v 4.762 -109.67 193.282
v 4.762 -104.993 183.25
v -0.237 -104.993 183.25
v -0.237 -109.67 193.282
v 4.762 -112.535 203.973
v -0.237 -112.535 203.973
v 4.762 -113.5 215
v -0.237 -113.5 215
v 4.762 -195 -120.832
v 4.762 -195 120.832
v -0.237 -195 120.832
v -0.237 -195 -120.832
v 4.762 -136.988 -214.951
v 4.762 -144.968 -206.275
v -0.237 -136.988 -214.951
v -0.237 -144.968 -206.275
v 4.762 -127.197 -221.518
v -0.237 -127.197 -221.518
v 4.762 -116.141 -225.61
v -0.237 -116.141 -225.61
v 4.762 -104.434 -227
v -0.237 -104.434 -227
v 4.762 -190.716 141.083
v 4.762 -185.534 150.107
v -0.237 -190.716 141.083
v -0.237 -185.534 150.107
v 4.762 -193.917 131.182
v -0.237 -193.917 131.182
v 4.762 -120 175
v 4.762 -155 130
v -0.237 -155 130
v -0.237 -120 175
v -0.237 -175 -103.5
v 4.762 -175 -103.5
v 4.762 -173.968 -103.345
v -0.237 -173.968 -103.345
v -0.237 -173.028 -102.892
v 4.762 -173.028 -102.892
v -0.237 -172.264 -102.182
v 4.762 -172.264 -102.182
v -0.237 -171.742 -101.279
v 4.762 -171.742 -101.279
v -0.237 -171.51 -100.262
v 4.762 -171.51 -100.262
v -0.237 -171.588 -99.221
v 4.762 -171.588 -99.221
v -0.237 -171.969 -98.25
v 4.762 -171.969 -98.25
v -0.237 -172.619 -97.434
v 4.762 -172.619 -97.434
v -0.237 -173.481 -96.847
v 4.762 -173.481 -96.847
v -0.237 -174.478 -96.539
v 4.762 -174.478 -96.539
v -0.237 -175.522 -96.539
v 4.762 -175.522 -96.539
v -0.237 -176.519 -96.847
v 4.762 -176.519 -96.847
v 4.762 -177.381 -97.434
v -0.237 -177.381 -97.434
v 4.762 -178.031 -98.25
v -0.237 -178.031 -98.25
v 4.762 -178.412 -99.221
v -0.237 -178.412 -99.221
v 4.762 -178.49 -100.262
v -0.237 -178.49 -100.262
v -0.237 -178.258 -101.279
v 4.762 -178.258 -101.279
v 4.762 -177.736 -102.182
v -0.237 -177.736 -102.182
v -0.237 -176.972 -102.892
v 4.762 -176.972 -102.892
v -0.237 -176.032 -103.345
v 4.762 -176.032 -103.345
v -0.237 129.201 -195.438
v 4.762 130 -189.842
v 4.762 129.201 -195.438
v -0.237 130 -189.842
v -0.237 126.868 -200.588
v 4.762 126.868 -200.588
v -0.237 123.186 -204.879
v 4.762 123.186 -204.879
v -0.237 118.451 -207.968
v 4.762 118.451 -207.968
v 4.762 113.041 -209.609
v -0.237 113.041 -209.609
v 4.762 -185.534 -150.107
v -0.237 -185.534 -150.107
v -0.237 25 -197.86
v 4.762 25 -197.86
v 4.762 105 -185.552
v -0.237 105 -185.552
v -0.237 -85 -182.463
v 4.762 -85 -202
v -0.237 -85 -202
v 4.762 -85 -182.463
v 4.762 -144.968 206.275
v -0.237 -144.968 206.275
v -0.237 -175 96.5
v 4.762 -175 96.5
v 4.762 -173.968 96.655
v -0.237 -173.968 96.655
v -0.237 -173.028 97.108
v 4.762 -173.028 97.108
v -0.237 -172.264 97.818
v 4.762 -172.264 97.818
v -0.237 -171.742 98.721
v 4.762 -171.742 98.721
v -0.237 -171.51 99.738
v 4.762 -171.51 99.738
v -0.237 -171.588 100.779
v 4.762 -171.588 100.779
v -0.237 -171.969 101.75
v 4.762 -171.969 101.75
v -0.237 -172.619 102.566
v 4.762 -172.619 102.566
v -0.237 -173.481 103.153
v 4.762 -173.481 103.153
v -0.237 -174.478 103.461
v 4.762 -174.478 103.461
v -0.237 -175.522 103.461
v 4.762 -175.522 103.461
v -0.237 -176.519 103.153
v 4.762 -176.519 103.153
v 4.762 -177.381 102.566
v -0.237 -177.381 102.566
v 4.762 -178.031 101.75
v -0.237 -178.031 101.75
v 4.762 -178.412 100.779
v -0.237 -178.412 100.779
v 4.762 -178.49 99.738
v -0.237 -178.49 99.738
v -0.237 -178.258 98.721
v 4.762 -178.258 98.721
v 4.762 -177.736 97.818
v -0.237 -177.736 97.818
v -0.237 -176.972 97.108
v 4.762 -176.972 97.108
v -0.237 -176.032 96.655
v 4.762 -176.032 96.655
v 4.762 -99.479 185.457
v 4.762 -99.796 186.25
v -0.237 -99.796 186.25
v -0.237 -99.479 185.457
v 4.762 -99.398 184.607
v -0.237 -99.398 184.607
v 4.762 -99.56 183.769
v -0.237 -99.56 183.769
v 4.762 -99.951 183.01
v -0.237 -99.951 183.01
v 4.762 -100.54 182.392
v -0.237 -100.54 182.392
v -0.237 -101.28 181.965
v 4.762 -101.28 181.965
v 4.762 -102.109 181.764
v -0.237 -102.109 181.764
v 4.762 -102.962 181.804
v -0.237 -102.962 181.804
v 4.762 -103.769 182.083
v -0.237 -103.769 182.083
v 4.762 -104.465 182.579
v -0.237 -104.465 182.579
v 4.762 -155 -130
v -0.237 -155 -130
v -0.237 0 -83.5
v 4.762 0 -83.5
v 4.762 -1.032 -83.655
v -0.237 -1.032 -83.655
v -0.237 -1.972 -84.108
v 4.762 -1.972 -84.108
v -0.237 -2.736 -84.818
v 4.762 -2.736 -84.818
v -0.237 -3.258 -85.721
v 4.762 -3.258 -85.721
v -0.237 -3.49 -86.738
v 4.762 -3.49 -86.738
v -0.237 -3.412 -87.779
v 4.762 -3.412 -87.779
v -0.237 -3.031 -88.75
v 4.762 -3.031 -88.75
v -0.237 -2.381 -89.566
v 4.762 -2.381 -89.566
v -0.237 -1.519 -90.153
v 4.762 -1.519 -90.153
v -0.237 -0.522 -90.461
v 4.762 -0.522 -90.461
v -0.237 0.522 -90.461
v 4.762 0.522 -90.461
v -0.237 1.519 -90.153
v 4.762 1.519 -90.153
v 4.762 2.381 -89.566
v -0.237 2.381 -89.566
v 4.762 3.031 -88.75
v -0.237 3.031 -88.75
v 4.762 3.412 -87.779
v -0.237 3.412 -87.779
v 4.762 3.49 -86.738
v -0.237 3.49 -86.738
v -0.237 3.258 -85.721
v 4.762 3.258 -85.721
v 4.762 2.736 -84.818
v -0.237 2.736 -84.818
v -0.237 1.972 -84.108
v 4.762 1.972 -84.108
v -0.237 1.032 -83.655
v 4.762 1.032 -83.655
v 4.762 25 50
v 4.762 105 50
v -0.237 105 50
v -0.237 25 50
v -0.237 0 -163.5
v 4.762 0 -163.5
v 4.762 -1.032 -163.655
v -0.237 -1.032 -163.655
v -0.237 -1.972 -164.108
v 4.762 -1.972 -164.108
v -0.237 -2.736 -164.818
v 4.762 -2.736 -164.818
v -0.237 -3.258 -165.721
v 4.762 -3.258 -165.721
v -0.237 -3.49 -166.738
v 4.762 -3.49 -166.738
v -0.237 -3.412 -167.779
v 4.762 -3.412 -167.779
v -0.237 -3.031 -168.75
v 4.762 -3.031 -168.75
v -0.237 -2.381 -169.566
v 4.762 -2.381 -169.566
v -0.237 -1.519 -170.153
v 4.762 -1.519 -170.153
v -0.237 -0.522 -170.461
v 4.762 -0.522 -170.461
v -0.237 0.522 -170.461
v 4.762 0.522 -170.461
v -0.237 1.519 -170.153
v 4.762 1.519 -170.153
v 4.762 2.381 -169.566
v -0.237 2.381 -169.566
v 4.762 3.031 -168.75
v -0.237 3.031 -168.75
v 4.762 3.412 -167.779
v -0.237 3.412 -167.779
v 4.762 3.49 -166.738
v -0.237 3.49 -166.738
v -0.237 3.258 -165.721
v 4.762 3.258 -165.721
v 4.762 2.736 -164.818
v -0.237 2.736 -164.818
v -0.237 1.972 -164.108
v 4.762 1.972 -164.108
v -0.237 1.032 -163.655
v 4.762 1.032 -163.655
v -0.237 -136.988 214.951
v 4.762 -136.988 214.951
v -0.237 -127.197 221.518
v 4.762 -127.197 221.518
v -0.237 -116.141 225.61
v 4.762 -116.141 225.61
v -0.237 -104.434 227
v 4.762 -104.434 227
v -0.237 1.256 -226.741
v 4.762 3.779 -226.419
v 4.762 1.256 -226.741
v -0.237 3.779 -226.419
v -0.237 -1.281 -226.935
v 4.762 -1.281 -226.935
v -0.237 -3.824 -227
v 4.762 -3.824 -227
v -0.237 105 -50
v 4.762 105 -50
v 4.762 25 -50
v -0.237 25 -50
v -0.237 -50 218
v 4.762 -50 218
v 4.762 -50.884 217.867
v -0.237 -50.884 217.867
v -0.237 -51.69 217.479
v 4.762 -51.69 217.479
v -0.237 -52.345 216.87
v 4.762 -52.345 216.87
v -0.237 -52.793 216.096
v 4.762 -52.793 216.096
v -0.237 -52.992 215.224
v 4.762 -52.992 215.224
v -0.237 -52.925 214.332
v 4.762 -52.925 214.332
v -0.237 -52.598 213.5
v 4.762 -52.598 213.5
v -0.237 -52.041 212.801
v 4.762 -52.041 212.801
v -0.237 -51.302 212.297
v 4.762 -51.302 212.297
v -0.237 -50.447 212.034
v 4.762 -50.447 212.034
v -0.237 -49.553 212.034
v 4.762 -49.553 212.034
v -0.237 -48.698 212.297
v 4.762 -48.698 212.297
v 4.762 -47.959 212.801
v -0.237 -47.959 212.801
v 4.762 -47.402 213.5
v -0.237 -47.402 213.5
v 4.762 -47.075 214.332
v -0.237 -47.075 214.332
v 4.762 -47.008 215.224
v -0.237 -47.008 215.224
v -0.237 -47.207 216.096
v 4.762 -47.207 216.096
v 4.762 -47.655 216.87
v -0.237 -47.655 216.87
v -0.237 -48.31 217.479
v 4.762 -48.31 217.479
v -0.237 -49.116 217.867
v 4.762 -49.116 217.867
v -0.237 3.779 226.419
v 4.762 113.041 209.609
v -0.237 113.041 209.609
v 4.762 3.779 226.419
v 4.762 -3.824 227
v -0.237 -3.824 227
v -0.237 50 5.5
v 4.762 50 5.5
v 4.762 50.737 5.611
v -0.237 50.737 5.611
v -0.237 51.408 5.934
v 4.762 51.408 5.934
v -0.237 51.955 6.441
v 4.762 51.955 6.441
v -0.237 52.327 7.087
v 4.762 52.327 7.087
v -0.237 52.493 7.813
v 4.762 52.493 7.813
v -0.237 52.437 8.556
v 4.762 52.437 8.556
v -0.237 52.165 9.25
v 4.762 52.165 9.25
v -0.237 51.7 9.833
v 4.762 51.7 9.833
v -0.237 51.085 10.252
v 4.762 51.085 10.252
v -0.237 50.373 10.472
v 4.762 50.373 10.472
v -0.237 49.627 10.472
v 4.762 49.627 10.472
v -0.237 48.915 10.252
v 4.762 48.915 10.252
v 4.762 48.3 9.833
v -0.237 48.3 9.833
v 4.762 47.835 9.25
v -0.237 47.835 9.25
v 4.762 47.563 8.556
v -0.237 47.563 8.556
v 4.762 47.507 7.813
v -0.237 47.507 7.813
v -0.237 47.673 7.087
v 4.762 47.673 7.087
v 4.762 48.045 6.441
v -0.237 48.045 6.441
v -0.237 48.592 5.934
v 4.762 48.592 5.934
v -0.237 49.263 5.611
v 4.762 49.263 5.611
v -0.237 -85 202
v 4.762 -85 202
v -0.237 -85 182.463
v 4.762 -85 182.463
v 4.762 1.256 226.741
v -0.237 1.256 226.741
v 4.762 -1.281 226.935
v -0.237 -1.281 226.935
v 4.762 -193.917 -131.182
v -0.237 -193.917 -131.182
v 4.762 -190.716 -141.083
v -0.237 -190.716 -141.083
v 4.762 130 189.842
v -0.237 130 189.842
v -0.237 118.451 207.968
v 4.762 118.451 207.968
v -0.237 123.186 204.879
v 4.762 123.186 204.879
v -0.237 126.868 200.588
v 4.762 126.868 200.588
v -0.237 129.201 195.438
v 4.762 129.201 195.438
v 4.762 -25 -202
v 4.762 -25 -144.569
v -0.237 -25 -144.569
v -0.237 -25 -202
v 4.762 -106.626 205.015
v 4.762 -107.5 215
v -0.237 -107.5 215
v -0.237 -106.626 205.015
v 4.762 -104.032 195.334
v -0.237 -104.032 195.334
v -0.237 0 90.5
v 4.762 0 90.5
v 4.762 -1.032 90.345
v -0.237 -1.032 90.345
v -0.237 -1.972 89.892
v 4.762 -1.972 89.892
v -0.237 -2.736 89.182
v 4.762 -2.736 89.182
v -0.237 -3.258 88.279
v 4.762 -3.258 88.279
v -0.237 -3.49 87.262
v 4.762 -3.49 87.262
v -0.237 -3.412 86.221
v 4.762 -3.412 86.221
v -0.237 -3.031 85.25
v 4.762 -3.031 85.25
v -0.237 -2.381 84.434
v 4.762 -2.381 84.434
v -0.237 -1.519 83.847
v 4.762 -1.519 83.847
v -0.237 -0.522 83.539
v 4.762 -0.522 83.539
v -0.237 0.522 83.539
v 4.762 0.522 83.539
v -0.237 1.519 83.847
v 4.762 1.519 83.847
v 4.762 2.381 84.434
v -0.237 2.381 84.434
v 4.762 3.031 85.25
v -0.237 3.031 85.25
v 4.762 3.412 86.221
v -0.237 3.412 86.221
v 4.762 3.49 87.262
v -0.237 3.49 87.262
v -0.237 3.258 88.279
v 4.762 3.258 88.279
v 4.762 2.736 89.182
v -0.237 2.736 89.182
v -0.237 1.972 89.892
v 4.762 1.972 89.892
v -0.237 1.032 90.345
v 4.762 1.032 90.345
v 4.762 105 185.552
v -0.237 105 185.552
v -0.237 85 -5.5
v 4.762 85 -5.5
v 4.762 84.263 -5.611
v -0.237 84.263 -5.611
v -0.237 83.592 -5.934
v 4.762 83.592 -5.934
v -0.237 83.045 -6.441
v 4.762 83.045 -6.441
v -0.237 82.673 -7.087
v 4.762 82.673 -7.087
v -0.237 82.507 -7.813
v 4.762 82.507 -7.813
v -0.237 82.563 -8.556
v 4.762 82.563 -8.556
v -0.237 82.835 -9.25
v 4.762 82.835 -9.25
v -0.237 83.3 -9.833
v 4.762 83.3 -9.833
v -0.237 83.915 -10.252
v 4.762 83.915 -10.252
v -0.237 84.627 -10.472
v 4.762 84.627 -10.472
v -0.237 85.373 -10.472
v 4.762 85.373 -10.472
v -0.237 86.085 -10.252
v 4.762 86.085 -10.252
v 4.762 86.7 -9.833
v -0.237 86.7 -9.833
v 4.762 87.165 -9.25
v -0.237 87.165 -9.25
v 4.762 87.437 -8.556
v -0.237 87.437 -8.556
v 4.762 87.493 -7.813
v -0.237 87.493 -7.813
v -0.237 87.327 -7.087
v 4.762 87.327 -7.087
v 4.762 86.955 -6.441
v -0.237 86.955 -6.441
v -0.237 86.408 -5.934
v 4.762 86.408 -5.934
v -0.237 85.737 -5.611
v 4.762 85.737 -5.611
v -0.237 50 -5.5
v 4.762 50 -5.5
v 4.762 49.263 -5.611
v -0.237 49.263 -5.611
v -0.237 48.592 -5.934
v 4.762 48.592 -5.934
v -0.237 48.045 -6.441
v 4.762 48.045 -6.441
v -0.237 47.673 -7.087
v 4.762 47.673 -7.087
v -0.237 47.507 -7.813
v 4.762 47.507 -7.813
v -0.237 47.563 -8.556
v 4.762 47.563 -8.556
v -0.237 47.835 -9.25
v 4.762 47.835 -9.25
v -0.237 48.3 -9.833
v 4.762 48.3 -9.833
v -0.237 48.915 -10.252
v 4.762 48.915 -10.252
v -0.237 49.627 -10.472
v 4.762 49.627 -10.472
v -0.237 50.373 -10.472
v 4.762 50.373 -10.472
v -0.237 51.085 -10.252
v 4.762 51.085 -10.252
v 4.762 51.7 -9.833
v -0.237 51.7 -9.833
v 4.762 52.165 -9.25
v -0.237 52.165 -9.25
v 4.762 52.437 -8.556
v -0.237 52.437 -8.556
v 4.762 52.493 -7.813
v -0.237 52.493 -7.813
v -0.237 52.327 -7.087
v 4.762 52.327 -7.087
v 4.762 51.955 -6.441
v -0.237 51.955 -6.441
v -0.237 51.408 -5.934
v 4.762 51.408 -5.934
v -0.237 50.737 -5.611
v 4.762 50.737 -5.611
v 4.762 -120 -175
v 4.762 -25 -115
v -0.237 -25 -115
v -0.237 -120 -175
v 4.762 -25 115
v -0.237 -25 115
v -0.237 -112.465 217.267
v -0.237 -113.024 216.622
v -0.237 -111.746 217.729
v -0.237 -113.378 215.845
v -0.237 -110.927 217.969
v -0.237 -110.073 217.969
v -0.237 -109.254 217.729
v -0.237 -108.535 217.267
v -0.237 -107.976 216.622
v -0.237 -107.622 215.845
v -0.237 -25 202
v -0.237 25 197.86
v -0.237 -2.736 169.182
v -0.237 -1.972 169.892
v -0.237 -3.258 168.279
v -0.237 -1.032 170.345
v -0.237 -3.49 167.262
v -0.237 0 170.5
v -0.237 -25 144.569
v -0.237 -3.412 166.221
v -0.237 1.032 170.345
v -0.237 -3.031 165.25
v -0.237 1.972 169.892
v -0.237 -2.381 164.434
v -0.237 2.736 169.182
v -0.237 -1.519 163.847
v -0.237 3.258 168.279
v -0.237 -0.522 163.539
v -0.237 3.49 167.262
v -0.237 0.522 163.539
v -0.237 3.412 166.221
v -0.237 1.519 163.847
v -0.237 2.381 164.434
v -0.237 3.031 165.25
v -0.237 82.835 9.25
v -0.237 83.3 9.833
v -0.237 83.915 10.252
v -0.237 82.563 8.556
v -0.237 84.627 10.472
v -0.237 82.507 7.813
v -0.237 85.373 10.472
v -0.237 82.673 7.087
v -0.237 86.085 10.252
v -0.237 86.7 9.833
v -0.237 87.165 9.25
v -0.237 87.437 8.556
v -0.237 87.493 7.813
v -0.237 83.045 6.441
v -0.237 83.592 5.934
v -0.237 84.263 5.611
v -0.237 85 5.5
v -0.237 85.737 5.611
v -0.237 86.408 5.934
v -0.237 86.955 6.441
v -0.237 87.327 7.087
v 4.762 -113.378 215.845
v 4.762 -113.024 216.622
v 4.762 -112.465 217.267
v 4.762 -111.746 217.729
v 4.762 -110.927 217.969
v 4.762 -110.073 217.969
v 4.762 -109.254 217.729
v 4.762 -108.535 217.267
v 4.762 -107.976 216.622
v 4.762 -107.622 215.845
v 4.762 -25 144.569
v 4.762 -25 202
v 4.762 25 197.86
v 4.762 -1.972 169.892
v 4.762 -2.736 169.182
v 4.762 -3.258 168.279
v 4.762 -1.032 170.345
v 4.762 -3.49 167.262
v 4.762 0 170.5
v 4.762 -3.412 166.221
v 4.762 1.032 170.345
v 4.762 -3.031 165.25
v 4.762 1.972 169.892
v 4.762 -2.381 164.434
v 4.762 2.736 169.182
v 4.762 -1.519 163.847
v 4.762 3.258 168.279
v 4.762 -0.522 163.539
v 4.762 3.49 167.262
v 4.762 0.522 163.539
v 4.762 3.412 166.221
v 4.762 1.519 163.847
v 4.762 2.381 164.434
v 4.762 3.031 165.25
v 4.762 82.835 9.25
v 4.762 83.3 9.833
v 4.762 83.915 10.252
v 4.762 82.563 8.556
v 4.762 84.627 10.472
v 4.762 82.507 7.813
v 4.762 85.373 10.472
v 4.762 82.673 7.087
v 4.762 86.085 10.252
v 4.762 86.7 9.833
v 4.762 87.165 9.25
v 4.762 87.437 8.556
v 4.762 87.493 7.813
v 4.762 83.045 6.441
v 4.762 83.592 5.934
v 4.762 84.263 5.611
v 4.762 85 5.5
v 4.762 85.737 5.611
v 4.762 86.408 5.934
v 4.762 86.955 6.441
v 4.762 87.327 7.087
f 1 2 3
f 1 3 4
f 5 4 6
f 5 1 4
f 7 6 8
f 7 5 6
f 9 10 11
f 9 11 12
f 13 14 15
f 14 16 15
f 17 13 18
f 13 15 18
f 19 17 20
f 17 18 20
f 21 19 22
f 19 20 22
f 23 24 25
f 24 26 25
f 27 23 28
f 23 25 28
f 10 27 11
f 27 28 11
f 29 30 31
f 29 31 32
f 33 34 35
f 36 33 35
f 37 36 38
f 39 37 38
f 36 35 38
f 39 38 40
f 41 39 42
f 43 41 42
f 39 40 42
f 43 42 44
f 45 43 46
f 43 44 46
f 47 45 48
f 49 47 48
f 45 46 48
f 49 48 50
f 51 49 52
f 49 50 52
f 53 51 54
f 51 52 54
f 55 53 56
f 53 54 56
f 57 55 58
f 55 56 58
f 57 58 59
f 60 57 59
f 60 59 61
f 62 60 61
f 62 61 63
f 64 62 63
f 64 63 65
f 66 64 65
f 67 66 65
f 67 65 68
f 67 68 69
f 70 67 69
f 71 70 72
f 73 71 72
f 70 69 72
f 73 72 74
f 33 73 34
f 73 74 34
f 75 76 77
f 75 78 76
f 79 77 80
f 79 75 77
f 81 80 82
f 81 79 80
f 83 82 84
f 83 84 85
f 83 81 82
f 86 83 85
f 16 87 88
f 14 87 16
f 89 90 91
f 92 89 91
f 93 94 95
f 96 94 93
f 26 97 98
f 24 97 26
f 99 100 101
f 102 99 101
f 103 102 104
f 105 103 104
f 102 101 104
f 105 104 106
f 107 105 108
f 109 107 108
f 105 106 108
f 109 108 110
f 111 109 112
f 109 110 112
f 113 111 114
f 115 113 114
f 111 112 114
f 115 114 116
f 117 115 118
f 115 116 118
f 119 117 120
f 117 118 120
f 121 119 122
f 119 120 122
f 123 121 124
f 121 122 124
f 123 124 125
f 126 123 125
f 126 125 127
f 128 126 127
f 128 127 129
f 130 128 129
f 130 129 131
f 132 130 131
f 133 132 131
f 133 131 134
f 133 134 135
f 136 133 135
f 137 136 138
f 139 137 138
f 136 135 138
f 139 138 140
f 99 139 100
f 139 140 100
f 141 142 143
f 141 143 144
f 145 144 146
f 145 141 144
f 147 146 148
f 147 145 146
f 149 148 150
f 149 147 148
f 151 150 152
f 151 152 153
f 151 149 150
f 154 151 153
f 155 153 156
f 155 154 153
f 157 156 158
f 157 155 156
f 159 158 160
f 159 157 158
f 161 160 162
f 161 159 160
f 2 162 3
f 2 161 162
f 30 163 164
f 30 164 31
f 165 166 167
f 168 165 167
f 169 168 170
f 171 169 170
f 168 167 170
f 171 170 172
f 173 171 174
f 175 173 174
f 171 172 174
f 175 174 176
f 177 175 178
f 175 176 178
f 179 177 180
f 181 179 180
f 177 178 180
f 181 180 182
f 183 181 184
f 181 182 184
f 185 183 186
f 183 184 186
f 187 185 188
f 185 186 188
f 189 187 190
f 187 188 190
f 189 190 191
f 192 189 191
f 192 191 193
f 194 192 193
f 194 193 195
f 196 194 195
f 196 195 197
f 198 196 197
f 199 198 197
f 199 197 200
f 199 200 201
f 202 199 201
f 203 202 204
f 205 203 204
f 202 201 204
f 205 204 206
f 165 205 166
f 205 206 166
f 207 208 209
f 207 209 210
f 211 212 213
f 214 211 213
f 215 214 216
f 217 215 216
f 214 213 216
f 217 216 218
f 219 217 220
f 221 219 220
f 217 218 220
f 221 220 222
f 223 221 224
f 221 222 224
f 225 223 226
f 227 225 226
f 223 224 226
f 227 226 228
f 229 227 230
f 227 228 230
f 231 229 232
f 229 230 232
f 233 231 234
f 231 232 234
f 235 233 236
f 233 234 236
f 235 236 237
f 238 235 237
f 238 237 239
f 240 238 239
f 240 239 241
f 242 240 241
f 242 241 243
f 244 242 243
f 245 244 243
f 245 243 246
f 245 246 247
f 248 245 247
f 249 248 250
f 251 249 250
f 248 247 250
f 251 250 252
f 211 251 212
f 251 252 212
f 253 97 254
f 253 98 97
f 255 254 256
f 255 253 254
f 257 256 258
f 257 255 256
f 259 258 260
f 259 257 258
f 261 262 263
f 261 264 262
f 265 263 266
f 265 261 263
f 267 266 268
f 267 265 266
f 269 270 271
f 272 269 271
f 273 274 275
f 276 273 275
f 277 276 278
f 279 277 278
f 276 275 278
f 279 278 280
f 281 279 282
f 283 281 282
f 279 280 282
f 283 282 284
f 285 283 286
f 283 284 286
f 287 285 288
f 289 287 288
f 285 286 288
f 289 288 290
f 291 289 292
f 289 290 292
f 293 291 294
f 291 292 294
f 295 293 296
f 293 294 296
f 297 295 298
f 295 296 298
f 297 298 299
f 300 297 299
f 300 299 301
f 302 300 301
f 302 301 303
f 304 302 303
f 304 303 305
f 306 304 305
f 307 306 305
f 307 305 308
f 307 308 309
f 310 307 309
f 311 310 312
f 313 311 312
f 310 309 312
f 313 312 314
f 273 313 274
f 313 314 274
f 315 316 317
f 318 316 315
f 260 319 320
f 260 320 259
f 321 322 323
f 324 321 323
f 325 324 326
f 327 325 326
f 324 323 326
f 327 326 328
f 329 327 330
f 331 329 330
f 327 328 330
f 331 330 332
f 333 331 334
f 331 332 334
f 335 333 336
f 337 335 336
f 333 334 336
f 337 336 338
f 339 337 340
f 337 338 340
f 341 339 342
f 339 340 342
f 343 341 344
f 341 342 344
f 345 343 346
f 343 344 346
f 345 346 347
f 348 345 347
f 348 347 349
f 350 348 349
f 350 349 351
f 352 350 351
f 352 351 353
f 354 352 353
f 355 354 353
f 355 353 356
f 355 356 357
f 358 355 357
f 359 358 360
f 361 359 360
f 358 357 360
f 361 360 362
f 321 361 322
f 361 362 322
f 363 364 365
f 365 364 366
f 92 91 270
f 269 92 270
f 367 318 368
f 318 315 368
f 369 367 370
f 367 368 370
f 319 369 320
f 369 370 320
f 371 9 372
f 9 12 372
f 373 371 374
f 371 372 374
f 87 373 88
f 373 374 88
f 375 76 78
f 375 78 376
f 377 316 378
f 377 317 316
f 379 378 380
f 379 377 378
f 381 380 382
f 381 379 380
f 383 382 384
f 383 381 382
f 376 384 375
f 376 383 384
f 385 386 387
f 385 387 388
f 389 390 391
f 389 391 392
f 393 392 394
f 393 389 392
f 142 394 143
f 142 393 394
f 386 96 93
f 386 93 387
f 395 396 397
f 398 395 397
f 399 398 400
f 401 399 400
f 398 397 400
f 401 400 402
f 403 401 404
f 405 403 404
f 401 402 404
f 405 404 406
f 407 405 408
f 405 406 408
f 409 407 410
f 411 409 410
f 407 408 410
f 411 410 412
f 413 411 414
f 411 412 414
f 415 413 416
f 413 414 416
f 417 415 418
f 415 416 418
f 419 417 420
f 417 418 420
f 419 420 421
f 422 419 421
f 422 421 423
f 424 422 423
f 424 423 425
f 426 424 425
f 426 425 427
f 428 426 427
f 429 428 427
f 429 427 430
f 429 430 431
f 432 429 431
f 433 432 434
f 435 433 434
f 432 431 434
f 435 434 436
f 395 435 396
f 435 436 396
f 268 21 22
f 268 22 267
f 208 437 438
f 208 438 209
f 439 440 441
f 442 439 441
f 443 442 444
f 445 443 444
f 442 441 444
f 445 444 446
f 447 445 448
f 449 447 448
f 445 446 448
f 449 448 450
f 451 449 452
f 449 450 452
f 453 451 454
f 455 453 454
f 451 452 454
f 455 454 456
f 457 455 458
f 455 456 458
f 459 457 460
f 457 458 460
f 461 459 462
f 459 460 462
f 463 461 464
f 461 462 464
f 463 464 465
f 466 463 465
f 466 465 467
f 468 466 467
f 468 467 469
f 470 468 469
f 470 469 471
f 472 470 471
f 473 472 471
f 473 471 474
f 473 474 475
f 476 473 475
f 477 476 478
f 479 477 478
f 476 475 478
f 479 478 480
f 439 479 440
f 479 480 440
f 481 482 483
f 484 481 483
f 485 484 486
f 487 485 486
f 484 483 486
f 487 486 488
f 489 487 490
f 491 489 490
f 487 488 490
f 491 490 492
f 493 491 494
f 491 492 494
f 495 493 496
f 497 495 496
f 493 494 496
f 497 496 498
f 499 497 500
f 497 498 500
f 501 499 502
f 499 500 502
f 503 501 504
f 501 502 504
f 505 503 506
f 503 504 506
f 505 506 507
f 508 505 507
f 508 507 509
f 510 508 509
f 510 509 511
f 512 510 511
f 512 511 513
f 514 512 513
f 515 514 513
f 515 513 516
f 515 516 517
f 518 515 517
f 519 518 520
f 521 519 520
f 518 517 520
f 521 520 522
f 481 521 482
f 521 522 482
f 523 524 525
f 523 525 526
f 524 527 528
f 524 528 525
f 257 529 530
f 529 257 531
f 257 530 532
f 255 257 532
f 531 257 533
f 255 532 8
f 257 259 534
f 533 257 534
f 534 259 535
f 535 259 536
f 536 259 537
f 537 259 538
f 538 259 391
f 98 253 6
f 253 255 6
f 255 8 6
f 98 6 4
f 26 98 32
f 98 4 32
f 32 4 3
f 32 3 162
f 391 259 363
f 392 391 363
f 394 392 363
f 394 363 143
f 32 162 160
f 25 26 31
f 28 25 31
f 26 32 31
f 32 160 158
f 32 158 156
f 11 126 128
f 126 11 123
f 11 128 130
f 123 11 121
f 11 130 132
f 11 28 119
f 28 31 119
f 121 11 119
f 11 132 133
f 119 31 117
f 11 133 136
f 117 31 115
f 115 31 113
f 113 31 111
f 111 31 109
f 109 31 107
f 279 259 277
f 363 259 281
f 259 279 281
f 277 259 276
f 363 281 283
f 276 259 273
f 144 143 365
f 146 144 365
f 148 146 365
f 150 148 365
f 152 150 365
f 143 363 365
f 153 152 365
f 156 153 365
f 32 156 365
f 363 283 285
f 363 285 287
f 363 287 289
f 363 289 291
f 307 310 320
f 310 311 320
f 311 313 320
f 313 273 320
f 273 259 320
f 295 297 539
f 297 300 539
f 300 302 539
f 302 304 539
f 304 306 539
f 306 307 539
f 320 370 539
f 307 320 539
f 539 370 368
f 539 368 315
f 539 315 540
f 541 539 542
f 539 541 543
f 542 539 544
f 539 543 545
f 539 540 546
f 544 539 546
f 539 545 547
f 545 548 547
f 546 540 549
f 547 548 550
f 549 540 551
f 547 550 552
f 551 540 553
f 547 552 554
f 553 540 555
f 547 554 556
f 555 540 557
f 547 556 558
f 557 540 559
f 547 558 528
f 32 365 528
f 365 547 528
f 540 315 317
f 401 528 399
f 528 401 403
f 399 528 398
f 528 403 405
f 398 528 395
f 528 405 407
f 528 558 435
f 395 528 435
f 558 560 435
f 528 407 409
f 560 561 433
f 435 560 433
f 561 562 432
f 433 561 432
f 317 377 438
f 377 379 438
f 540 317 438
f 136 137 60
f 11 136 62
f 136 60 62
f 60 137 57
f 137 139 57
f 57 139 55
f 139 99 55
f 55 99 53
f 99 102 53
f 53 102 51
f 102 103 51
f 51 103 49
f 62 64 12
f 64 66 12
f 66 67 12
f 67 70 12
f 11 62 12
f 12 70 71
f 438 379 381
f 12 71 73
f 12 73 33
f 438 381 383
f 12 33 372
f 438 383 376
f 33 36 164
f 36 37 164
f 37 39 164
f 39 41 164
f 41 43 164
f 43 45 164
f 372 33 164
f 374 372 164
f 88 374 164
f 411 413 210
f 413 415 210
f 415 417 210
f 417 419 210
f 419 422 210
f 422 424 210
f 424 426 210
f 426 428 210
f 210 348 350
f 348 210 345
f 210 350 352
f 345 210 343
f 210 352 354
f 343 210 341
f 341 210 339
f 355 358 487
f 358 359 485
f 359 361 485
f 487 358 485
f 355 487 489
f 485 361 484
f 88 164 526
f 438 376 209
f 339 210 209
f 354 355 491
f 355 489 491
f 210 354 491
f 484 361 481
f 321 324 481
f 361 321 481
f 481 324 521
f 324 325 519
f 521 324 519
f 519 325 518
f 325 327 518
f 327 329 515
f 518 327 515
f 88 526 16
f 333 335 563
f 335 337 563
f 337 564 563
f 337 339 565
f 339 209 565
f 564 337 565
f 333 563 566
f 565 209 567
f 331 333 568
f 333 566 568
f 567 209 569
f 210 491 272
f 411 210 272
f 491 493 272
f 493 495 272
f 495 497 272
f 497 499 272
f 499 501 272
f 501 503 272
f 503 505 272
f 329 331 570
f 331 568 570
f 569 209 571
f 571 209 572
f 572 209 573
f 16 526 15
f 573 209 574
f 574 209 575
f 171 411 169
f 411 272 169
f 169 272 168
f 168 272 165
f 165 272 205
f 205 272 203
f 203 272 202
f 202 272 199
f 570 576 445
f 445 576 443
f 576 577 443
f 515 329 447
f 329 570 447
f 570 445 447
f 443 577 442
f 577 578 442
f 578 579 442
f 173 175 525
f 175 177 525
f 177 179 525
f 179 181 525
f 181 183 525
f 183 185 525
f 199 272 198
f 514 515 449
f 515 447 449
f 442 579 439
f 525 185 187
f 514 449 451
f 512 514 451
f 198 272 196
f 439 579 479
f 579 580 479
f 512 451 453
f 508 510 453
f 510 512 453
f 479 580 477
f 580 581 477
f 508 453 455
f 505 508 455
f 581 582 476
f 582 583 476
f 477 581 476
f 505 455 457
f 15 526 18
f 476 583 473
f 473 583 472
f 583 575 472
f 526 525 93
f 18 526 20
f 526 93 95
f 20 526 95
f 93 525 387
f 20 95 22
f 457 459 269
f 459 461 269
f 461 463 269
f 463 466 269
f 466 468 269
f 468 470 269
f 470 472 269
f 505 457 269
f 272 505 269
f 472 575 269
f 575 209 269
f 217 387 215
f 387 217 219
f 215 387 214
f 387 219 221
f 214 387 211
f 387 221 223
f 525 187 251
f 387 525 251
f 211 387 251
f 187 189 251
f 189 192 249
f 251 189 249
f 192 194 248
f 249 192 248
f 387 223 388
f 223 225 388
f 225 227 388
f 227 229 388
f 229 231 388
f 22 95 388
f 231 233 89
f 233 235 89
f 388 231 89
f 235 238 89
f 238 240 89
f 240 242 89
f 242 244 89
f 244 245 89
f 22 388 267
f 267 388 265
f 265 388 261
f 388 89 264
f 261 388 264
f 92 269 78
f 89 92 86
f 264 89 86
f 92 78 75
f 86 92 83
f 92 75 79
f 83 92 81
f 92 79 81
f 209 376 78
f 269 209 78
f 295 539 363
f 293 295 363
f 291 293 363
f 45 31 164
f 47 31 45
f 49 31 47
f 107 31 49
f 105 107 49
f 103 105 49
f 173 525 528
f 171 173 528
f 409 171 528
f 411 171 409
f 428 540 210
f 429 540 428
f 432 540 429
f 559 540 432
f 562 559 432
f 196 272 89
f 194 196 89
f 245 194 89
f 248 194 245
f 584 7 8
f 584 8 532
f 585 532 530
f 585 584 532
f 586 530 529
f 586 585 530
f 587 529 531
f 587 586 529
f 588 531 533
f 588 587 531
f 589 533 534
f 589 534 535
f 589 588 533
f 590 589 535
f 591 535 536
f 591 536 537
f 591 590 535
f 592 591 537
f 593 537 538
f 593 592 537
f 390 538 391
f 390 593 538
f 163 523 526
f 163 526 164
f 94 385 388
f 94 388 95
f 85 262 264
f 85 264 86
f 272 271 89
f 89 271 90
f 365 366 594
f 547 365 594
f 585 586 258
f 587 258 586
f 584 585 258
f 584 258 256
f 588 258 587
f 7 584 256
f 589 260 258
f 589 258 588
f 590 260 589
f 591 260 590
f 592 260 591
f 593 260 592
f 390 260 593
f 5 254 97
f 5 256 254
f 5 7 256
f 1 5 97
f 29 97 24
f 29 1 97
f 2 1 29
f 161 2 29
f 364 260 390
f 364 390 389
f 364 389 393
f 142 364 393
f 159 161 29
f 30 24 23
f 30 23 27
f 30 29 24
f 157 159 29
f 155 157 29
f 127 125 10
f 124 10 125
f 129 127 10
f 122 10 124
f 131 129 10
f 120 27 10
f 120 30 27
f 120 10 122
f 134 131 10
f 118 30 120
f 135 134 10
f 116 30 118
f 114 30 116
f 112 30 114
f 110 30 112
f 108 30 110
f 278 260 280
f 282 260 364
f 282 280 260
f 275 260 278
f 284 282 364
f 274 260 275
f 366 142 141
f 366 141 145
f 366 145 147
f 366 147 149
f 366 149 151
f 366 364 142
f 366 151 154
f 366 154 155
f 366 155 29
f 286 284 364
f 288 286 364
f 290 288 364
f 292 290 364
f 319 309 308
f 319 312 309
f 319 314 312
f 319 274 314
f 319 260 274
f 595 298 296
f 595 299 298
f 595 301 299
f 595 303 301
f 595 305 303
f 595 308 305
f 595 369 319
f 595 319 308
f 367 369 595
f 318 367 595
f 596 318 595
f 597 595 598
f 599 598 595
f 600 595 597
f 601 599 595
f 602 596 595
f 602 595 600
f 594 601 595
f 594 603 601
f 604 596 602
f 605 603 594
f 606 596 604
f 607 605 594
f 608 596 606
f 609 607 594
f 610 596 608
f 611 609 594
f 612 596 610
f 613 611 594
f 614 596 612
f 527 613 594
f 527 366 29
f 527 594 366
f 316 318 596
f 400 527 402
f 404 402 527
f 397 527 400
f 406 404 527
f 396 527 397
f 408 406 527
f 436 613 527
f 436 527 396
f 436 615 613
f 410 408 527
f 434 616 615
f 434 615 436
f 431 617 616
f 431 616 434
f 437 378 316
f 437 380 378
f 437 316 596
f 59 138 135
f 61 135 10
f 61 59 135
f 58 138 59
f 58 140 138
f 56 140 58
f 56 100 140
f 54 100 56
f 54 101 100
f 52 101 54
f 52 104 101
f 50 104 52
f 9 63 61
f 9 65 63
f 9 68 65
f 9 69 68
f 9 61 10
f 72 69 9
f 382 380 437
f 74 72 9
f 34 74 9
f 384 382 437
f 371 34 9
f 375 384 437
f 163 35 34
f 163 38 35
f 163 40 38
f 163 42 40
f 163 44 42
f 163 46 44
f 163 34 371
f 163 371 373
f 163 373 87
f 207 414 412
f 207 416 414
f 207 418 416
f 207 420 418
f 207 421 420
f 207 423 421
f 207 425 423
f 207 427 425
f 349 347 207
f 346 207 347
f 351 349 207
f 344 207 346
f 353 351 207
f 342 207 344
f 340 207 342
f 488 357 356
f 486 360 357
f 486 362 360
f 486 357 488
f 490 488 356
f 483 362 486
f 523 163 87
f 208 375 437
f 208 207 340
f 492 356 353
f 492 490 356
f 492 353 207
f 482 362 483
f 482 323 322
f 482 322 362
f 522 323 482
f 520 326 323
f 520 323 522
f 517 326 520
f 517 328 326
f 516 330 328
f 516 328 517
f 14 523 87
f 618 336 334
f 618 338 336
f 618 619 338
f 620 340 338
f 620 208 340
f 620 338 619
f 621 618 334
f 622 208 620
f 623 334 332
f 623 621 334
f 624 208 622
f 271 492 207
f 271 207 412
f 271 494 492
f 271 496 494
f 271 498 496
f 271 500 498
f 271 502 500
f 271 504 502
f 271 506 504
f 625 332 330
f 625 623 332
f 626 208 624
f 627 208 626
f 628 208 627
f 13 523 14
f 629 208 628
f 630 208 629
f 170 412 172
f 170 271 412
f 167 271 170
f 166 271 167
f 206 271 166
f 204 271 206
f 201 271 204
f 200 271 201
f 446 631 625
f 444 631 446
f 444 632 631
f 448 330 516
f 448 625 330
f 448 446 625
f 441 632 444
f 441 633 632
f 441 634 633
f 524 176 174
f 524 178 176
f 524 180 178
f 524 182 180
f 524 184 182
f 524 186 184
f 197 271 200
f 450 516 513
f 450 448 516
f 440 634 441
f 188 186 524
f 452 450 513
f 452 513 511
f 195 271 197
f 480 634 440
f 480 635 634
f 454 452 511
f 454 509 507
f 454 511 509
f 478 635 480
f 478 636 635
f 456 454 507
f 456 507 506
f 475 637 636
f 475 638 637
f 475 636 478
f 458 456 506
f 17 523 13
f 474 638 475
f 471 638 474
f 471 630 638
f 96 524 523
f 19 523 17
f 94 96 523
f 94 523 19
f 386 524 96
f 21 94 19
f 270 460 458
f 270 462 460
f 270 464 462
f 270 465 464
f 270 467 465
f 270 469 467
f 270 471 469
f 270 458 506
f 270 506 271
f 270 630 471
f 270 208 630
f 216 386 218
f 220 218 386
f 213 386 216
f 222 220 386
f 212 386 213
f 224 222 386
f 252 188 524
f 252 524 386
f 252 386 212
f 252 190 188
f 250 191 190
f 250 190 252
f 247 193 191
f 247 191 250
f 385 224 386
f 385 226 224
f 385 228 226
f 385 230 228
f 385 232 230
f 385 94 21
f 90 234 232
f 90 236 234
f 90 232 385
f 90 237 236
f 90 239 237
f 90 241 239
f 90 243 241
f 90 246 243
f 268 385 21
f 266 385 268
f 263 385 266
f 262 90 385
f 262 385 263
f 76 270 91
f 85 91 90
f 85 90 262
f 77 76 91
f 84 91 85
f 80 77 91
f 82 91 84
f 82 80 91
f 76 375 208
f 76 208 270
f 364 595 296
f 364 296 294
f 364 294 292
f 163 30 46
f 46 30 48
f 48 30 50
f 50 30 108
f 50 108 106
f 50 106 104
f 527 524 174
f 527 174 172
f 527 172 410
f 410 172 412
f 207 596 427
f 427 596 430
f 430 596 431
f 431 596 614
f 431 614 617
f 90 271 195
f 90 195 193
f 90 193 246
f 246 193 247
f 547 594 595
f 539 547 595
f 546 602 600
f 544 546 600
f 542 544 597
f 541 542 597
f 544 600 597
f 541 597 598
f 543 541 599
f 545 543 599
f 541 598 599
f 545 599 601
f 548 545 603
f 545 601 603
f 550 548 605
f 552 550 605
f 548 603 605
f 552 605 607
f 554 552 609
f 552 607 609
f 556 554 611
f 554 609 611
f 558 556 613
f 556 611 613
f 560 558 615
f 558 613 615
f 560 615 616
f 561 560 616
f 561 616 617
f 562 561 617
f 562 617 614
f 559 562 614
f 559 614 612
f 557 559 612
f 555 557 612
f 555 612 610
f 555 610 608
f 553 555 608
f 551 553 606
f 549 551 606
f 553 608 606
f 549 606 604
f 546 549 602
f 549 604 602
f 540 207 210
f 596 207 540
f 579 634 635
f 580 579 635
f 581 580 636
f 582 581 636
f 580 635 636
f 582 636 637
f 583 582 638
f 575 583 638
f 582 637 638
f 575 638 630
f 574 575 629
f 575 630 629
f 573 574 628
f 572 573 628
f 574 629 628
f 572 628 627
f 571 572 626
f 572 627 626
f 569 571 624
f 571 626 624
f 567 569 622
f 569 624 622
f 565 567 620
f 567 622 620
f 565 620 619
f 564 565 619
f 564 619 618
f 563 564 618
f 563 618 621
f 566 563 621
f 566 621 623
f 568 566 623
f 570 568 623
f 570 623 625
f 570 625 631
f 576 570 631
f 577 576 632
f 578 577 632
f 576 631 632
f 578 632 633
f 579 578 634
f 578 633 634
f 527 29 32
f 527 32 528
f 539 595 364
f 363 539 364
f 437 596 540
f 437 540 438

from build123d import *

# Parameters (mm, degrees)
SKETCH_1_R      = 2.5
SKETCH_1_R_2    = 3.5
SKETCH_1_R_3    = 3
EXTRUDE_1_DEPTH = 5
FILLET_1_R      = 20
FILLET_2_R      = 20
FILLET_3_R      = 50
FILLET_4_R      = 50
FILLET_5_R      = 50
FILLET_6_R      = 50
FILLET_7_R      = 50
FILLET_8_R      = 50


with BuildPart() as part:
    # 草图1 → 凸台-拉伸1 (new body)
    with BuildSketch(Plane(origin=(4.7625, 0, 0), x_dir=(0, 0, -1), z_dir=(1, 0, 0))):
        Polygon((-227, 0), (-227, -130), (-137, -195), (137, -195), (227, -130), (227, 0), (207, 130), (-207, 130), align=None)
        with Locations((-8, 85)):
            Circle(SKETCH_1_R, mode=Mode.SUBTRACT)
        with Locations((-8, 50)):
            Circle(SKETCH_1_R, mode=Mode.SUBTRACT)
        with Locations(Location((8, 50, 0), (0, 0, 180))):
            Circle(SKETCH_1_R, mode=Mode.SUBTRACT)
        with Locations(Location((8, 85, 0), (0, 0, 180))):
            Circle(SKETCH_1_R, mode=Mode.SUBTRACT)
        with Locations((-100, -175)):
            Circle(SKETCH_1_R_2, mode=Mode.SUBTRACT)
        with Locations((100, -175)):
            Circle(SKETCH_1_R_2, mode=Mode.SUBTRACT)
        with Locations(Location((167, 0, 0), (0, 0, 180))):
            Circle(SKETCH_1_R_2, mode=Mode.SUBTRACT)
        with Locations(Location((87, 0, 0), (0, 0, 180))):
            Circle(SKETCH_1_R_2, mode=Mode.SUBTRACT)
        with Locations(Location((-87, 0, 0), (0, 0, 180))):
            Circle(SKETCH_1_R_2, mode=Mode.SUBTRACT)
        with Locations(Location((-167, 0, 0), (0, 0, 180))):
            Circle(SKETCH_1_R_2, mode=Mode.SUBTRACT)
        with Locations(Location((-215, -50, 0), (0, 0, 180))):
            Circle(SKETCH_1_R_3, mode=Mode.SUBTRACT)
        Polygon((130, -155), (-130, -155), (-175, -120), (-115, -25), (115, -25), (175, -120), align=None, mode=Mode.SUBTRACT)
        Polygon((-144.568690861, -25), (-202, -25), (-202, -85), (-182.463427703, -85), align=None, mode=Mode.SUBTRACT)
        Polygon((182.463427703, -85), (144.568690861, -25), (202, -25), (202, -85), align=None, mode=Mode.SUBTRACT)
        Polygon((-185.552026081, 105), (-50, 105), (-50, 25), (-197.859718389, 25), align=None, mode=Mode.SUBTRACT)
        Polygon((50, 105), (50, 25), (197.859718389, 25), (185.552026081, 105), align=None, mode=Mode.SUBTRACT)
        with BuildLine():
            ThreePointArc((-215, -113.5), (-218, -110.5), (-215, -107.5))
            ThreePointArc((-215, -107.5), (-200.117904907, -105.540735012), (-186.25, -99.796460718))
            ThreePointArc((-186.25, -99.796460718), (-182.151923789, -100.894536929), (-183.25, -104.99261314))
            ThreePointArc((-183.25, -104.99261314), (-198.564990636, -111.336289969), (-215, -113.5))
        make_face(mode=Mode.SUBTRACT)
    extrude(amount=-EXTRUDE_1_DEPTH)

    # 圆角1
    fillet_1_edges = [part.edges().sort_by_distance(p)[0] for p in [
        (2.2625, 130, 207),
    ]]
    fillet(fillet_1_edges, radius=FILLET_1_R)

    # 圆角2
    fillet_2_edges = [part.edges().sort_by_distance(p)[0] for p in [
        (2.2625, 130, -207),
    ]]
    fillet(fillet_2_edges, radius=FILLET_2_R)

    # 圆角3
    fillet_3_edges = [part.edges().sort_by_distance(p)[0] for p in [
        (2.2625, 0, 227),
    ]]
    fillet(fillet_3_edges, radius=FILLET_3_R)

    # 圆角4
    fillet_4_edges = [part.edges().sort_by_distance(p)[0] for p in [
        (2.2625, 0, -227),
    ]]
    fillet(fillet_4_edges, radius=FILLET_4_R)

    # 圆角5
    fillet_5_edges = [part.edges().sort_by_distance(p)[0] for p in [
        (2.2625, -130, 227),
    ]]
    fillet(fillet_5_edges, radius=FILLET_5_R)

    # 圆角6
    fillet_6_edges = [part.edges().sort_by_distance(p)[0] for p in [
        (2.2625, -195, 137),
    ]]
    fillet(fillet_6_edges, radius=FILLET_6_R)

    # 圆角7
    fillet_7_edges = [part.edges().sort_by_distance(p)[0] for p in [
        (2.2625, -195, -137),
    ]]
    fillet(fillet_7_edges, radius=FILLET_7_R)

    # 圆角8
    fillet_8_edges = [part.edges().sort_by_distance(p)[0] for p in [
        (2.2625, -130, -227),
    ]]
    fillet(fillet_8_edges, radius=FILLET_8_R)


solid = part.part
